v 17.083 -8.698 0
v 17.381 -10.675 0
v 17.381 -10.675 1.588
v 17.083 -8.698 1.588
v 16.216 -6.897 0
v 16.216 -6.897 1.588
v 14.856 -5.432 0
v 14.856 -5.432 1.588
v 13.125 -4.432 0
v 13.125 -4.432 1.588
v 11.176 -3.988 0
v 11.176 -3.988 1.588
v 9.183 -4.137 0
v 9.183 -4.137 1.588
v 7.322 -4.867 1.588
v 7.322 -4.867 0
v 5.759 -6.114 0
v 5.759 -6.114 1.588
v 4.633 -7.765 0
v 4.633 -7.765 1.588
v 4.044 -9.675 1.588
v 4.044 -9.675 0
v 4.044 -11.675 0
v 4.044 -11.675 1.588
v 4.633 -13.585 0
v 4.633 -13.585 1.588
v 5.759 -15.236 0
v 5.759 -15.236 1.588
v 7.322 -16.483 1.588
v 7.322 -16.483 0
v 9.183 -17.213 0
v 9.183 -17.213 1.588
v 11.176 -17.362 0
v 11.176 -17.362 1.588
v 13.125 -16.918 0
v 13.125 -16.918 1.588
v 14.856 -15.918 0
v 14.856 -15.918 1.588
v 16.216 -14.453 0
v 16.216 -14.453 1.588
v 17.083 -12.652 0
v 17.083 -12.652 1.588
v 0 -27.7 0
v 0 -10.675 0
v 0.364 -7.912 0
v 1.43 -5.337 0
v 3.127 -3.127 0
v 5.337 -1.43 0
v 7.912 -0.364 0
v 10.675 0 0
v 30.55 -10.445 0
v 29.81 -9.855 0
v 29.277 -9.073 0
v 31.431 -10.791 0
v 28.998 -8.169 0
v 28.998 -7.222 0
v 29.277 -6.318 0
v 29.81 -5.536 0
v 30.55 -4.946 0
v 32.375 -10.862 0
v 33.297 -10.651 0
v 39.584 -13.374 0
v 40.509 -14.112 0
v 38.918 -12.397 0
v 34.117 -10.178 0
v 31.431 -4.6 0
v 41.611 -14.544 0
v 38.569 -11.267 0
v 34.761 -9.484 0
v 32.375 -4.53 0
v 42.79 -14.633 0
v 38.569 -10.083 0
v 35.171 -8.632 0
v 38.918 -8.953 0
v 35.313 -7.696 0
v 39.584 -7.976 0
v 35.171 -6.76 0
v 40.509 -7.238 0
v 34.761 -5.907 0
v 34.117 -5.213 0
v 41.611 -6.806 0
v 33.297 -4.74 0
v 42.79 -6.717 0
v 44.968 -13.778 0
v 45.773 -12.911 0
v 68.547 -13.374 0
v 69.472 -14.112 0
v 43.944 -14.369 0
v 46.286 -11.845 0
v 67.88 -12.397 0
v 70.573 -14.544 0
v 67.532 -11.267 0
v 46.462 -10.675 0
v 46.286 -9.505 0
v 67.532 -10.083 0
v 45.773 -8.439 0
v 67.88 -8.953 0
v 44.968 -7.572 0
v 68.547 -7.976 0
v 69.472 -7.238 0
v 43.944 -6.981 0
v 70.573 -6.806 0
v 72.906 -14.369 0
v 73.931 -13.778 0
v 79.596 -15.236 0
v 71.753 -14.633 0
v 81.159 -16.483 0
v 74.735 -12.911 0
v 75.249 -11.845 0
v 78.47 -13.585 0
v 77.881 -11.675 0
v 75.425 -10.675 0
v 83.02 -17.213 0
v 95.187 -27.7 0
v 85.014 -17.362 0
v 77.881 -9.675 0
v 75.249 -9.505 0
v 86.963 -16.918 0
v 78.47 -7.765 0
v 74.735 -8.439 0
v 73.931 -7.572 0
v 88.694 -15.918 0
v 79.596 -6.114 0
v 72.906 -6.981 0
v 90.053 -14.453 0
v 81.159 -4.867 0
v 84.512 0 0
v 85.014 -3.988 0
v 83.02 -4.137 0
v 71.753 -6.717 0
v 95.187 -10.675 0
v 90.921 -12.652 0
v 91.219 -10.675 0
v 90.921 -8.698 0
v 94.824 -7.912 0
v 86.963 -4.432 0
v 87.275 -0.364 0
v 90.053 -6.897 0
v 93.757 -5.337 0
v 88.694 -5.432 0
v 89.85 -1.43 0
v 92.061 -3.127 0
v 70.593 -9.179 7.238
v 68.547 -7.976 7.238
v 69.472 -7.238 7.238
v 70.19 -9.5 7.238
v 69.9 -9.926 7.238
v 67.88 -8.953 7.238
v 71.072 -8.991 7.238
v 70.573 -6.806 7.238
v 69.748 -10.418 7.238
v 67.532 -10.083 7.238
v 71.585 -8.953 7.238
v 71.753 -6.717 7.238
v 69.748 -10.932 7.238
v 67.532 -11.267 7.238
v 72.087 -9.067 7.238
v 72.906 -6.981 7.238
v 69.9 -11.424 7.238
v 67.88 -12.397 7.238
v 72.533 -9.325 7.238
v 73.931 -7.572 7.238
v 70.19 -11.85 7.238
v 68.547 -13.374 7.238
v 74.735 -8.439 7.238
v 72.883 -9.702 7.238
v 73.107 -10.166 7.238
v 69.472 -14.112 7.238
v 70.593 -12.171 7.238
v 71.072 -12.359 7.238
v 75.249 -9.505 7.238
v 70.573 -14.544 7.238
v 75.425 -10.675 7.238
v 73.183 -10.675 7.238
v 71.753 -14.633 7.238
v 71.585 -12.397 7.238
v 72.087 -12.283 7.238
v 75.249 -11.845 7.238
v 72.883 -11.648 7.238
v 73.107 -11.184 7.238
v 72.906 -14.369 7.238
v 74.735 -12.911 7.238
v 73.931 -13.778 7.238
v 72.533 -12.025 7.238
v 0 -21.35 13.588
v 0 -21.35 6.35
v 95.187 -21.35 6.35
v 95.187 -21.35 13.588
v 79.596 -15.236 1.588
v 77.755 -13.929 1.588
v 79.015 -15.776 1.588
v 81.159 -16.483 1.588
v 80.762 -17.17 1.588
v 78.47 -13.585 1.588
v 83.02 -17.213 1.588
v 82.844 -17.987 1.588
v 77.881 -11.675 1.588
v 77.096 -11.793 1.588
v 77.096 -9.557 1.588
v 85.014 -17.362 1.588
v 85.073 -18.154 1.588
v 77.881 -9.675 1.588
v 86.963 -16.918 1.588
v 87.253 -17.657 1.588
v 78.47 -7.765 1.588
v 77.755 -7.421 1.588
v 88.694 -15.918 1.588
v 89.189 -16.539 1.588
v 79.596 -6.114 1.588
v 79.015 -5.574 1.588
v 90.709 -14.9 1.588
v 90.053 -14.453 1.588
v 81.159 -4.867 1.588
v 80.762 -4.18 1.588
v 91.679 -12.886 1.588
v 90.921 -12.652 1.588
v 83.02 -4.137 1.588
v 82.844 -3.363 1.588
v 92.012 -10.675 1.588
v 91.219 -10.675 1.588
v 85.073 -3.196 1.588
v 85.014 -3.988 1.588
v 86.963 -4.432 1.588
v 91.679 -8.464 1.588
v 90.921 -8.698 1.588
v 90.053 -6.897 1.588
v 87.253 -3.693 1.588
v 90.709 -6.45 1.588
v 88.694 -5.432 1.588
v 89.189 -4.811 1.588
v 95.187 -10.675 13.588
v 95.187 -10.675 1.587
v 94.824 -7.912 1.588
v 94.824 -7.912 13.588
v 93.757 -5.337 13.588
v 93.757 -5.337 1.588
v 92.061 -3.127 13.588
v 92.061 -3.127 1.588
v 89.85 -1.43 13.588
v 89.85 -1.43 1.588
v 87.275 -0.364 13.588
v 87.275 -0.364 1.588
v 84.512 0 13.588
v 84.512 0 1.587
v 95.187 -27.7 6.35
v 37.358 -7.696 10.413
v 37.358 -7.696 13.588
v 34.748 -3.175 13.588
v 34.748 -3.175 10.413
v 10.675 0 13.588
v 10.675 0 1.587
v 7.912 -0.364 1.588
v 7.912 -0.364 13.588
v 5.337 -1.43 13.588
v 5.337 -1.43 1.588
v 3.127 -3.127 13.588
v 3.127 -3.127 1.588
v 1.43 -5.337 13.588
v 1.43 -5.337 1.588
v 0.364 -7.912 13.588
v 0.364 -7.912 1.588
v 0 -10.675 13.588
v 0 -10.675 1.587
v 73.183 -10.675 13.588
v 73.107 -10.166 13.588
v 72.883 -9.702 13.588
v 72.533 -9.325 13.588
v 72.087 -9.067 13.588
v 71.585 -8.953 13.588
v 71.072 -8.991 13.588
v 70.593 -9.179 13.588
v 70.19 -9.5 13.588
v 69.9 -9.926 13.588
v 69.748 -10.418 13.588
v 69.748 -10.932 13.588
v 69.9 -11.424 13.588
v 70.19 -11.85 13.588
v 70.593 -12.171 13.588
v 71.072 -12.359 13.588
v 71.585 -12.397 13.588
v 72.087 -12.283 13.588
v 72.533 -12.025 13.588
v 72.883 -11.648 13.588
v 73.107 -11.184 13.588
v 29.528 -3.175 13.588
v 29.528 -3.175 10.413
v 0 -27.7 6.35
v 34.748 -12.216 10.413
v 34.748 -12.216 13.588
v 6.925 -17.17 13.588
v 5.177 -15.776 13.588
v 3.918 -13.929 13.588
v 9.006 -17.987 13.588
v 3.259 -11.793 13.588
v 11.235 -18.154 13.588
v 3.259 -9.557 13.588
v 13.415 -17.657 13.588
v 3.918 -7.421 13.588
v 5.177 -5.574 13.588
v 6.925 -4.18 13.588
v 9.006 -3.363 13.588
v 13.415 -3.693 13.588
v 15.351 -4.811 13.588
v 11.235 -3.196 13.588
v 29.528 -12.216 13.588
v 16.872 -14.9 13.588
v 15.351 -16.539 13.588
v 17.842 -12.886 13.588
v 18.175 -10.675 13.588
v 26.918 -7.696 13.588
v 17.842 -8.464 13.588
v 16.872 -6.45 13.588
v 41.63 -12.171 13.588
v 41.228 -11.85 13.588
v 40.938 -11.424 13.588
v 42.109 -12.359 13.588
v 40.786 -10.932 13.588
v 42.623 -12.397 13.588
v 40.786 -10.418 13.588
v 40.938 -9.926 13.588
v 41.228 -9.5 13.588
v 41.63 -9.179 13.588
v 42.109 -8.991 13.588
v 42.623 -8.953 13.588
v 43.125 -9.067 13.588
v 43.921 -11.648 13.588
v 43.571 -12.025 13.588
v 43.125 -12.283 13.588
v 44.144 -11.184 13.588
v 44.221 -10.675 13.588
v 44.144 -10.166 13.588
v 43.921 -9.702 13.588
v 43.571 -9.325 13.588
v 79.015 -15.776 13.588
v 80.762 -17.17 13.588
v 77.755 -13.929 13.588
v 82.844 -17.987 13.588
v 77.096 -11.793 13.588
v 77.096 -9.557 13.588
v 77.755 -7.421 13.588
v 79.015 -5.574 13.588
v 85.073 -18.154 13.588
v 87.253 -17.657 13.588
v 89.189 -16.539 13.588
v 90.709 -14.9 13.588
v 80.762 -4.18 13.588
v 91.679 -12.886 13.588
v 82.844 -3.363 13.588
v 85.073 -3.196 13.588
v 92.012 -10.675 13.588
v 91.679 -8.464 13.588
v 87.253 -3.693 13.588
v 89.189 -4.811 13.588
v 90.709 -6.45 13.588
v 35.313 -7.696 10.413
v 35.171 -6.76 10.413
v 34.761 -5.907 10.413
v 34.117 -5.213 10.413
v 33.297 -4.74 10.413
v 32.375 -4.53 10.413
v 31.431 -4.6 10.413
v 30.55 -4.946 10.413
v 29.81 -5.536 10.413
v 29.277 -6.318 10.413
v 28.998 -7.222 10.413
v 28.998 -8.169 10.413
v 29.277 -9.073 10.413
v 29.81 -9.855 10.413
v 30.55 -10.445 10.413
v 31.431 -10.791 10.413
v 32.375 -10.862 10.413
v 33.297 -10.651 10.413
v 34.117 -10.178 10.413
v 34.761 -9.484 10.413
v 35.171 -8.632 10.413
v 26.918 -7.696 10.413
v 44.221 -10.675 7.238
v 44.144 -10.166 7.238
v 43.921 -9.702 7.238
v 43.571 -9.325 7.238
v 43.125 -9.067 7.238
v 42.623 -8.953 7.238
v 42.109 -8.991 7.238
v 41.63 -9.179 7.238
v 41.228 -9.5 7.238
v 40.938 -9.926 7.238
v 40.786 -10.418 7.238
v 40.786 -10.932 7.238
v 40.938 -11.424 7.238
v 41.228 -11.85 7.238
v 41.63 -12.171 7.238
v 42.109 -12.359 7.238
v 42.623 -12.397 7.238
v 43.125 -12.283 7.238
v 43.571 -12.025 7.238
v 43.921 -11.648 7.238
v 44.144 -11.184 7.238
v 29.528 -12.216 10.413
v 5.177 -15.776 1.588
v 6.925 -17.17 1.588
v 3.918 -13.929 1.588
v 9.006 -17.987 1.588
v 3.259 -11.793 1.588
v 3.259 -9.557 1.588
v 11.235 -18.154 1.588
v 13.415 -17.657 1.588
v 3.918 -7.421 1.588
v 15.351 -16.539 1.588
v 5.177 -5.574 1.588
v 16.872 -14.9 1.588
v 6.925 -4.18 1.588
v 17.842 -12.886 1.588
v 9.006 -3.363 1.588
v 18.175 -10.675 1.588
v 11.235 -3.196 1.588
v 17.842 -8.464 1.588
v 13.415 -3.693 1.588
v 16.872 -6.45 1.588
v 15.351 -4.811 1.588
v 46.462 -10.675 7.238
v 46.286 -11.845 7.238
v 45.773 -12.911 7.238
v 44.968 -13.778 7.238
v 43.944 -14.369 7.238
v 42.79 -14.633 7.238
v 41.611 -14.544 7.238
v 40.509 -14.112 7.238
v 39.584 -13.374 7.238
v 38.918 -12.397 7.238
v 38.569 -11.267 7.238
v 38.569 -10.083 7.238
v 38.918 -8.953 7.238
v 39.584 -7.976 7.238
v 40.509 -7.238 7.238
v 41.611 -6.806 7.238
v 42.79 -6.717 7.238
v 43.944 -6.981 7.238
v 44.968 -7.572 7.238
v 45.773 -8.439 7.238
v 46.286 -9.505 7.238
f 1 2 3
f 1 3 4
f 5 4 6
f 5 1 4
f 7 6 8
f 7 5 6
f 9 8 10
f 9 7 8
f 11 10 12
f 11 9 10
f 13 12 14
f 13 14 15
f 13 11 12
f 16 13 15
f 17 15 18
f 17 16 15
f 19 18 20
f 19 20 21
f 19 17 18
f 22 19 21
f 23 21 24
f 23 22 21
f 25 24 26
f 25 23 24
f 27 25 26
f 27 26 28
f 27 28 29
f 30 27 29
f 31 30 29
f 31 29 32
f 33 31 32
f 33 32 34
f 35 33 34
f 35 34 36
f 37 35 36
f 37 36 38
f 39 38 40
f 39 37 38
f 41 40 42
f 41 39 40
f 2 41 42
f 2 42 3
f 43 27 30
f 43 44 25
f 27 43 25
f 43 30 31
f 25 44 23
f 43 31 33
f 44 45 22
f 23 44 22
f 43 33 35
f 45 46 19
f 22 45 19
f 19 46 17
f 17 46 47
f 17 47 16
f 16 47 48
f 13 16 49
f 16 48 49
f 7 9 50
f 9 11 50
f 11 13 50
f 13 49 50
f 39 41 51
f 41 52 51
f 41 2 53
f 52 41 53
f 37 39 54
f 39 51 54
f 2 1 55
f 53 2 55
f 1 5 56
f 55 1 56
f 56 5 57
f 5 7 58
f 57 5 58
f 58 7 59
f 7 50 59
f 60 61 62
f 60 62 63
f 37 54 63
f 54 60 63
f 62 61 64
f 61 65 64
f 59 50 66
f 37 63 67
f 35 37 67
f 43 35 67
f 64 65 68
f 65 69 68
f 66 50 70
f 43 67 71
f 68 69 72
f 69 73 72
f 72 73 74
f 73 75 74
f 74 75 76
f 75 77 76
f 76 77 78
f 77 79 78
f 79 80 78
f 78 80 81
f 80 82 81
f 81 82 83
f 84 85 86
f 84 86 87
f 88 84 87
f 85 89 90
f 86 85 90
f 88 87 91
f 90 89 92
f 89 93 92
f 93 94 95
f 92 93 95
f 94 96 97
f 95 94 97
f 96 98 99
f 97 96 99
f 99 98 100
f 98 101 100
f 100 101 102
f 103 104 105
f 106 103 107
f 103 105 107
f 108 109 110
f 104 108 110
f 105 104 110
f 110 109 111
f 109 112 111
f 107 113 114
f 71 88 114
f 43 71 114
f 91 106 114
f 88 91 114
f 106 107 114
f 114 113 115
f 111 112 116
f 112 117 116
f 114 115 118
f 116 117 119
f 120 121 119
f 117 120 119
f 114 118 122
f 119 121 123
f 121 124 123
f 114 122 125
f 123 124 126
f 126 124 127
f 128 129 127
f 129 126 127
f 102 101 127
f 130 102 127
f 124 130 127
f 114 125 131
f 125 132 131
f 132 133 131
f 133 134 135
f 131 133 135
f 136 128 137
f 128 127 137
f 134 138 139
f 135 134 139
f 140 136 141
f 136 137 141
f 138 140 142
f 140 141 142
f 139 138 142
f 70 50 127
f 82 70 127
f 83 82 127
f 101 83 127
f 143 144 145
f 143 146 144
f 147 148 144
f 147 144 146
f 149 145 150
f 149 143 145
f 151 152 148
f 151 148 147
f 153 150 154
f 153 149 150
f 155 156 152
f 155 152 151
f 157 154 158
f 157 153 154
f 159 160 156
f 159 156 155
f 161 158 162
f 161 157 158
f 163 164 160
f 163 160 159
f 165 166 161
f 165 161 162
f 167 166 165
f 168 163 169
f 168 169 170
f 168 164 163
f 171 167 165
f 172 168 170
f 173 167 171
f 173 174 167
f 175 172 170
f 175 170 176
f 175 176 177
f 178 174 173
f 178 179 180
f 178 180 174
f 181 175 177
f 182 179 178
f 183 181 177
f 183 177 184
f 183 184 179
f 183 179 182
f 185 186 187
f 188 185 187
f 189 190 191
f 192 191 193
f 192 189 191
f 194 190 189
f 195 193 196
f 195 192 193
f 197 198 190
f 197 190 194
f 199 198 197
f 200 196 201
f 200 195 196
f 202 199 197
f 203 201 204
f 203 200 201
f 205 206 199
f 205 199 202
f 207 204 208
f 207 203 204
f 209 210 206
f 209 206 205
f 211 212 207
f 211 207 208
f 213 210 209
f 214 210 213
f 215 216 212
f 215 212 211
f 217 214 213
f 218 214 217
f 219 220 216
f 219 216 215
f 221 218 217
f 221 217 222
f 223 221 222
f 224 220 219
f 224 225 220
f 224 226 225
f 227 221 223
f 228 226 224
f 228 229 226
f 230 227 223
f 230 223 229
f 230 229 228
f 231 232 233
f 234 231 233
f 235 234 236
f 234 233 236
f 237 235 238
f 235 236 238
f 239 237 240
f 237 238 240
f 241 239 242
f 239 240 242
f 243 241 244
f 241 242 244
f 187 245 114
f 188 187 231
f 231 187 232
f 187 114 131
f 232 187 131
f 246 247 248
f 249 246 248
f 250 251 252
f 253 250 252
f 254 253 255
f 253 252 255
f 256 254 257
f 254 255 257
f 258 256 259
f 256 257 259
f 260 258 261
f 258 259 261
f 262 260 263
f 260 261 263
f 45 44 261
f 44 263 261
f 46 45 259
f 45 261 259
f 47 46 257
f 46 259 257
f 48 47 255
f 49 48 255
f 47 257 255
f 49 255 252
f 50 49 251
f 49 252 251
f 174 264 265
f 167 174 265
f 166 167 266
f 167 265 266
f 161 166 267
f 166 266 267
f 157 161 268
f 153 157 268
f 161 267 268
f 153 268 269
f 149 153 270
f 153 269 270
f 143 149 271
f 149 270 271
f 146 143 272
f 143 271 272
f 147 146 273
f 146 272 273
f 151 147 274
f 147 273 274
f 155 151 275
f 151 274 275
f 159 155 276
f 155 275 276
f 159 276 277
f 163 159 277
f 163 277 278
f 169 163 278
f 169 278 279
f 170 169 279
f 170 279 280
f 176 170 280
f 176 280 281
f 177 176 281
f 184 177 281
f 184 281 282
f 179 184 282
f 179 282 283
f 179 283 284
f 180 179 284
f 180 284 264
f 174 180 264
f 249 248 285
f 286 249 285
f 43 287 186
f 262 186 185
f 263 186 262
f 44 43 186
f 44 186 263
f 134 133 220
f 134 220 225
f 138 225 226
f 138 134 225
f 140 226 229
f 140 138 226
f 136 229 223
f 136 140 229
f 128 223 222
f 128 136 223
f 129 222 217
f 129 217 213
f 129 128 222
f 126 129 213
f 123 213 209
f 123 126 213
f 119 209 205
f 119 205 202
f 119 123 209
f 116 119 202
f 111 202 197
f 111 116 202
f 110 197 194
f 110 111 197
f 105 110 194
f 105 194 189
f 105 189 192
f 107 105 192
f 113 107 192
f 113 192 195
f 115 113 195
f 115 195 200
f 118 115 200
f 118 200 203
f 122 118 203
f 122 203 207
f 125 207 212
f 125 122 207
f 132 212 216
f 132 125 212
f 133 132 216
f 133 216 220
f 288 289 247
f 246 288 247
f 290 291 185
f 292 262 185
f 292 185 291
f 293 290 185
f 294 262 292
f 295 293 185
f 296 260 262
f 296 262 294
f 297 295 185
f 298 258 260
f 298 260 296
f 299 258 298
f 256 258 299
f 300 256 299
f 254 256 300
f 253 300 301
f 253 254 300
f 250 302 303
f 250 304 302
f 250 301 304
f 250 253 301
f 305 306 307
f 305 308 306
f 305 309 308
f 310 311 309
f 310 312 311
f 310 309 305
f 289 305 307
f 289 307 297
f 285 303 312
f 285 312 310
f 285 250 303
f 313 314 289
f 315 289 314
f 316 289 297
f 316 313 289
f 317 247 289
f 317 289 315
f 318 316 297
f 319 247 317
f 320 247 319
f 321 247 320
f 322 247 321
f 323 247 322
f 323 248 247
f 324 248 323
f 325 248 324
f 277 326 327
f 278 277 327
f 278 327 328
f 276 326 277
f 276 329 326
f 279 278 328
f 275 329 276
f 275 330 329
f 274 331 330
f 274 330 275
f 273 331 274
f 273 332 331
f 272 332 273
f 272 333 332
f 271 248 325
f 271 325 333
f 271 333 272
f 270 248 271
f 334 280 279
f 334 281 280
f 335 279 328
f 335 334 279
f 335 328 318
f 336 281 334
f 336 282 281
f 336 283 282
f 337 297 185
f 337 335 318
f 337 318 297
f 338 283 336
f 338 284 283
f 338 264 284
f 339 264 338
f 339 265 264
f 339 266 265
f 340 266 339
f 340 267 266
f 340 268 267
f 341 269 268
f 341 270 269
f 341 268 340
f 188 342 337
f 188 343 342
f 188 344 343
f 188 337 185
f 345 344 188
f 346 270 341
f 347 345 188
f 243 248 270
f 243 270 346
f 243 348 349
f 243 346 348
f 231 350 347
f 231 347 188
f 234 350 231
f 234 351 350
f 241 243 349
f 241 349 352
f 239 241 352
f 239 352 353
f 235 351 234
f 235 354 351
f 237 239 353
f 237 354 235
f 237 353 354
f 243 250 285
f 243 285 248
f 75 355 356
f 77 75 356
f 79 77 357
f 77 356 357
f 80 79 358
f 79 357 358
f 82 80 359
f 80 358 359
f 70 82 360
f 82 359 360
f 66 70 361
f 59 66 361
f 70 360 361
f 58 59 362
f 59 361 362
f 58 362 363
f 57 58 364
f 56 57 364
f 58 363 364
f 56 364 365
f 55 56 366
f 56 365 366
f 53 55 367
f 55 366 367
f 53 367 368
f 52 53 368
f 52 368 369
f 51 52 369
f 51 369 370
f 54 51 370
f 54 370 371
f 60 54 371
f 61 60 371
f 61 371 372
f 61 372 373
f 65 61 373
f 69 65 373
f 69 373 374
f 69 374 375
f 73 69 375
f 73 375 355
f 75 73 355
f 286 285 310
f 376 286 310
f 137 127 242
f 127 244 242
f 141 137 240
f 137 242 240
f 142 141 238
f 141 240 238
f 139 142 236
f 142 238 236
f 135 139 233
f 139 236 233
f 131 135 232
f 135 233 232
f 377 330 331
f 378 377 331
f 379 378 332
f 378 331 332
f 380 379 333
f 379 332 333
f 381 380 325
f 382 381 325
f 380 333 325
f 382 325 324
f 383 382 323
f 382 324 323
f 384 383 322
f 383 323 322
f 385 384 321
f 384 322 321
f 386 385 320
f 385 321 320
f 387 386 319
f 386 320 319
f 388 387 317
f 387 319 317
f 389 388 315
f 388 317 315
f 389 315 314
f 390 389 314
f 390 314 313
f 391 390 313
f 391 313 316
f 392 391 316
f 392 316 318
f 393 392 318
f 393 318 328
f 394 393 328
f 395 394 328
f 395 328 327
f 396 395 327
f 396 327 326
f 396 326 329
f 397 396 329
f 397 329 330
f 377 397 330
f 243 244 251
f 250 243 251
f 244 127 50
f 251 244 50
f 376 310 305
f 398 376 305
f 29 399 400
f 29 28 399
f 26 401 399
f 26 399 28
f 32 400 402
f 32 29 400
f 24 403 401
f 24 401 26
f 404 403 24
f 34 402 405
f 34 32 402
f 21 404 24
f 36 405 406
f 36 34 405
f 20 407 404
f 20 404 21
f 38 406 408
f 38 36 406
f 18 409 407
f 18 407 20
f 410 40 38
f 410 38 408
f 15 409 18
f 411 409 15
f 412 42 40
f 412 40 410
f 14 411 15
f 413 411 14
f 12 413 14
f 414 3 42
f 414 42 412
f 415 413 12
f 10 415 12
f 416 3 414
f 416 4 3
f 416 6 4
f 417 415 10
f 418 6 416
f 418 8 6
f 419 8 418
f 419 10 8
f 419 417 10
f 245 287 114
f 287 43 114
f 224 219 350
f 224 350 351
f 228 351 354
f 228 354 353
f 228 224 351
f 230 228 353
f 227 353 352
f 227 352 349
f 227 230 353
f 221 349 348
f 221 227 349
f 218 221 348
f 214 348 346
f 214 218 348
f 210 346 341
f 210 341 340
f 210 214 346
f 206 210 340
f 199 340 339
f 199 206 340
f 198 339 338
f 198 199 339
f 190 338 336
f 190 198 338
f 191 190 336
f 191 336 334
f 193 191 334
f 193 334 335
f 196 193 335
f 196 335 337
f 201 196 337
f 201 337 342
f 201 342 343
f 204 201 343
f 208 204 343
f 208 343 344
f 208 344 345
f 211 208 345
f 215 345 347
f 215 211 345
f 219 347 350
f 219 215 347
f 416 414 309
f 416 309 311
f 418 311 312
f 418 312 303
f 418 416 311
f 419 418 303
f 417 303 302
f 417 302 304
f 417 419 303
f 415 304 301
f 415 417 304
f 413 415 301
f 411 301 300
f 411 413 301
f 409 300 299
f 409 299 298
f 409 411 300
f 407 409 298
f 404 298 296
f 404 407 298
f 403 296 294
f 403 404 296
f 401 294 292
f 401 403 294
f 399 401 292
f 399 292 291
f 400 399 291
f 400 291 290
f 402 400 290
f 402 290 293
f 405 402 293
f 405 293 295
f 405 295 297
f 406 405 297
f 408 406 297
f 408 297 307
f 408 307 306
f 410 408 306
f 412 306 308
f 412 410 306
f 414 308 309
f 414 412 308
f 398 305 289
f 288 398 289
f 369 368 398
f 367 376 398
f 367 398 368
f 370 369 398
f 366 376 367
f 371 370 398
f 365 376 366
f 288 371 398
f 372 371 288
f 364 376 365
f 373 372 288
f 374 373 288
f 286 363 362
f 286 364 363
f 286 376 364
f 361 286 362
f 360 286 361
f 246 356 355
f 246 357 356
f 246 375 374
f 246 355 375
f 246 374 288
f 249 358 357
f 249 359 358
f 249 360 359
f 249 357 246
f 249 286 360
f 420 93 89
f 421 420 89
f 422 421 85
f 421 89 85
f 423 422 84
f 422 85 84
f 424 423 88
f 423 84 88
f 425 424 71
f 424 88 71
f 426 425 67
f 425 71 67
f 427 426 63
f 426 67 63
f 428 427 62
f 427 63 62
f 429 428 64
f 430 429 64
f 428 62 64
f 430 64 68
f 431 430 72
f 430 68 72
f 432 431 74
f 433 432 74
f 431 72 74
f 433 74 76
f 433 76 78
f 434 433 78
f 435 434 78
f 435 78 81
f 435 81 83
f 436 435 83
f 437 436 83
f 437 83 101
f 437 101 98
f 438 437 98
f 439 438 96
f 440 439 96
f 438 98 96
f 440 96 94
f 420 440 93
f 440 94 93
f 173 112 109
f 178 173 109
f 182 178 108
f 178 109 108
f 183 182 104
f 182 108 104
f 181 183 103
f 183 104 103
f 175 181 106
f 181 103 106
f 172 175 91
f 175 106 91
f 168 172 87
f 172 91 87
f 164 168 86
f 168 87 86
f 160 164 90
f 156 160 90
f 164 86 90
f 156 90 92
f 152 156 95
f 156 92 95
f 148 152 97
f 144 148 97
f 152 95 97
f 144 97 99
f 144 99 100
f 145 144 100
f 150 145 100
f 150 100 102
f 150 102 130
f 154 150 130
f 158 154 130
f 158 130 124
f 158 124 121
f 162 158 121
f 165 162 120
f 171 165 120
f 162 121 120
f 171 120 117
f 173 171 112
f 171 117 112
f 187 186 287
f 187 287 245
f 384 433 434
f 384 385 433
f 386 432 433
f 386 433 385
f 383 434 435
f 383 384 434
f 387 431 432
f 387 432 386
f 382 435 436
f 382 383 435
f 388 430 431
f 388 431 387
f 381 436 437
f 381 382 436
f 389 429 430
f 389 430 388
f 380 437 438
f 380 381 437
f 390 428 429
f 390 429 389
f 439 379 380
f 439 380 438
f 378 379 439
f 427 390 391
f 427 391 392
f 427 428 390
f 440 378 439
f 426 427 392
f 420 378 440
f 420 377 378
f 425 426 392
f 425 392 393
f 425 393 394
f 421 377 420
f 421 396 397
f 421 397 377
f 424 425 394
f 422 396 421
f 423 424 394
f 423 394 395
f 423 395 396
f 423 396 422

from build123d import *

# Parameters (mm, degrees)
F0_W      = 95.1874652
F0_H      = 27.6999954
F0_R      = 6.7062477
F1_DEPTH  = 1.5875
F2_R      = 10.6749977
F3_R      = 7.5
F4_DEPTH  = 12
F5_DEPTH  = 4.7625
F6_R      = 1.7272
F6_R_2    = 3.175
F7_DEPTH  = 13.5875
F8_R      = 3.96875
F9_DEPTH  = 7.2375014
F11_DEPTH = 3.175


with BuildPart() as f1:
    # F0 (on Top) → F1 (new body)
    with BuildSketch(Plane.XY):
        with Locations((47.5937326, -13.8499977)):
            Rectangle(F0_W, F0_H)
        with Locations((10.6749977, -10.6749977)):
            Circle(F0_R, mode=Mode.SUBTRACT)
        with Locations((84.5124675, -10.6749977)):
            Circle(F0_R, mode=Mode.SUBTRACT)
    extrude(amount=F1_DEPTH)

    # F2
    f2_edges = [f1.edges().sort_by_distance(p)[0] for p in [
        (0, 0, 0.79375),
        (95.187465, 0, 0.79375),
    ]]
    fillet(f2_edges, radius=F2_R)

    # F3 (on face) → F4 (join)
    with BuildSketch(Plane.XY.offset(1.5875)):
        with BuildLine():
            Line((0, -10.6749977), (0, -21.3499954))
            Line((0, -21.3499954), (95.1874652, -21.3499954))
            Line((95.1874652, -21.3499954), (95.1874652, -10.6749977))
            ThreePointArc((95.1874652, -10.6749977), (92.0608307628, -3.1266344372), (84.5124675, 0))
            Line((84.5124675, 0), (10.6749977, 0))
            ThreePointArc((10.6749977, 0), (3.1266344372, -3.1266344372), (0, -10.6749977))
        make_face()
        with Locations((10.6749977, -10.6749977)):
            Circle(F3_R, mode=Mode.SUBTRACT)
        with Locations((84.5124675, -10.6749977)):
            Circle(F3_R, mode=Mode.SUBTRACT)
    extrude(amount=F4_DEPTH)

    # F5 (add): a face of the model
    f5_faces = [f1.faces().sort_by_distance(p)[0] for p in [
        (47.5937326, -24.5249954, 1.5875),
    ]]
    extrude(f5_faces, amount=F5_DEPTH)

    # F6 (on face) → F7 (cut, through all)
    with BuildSketch(Plane.XY.offset(13.5875)):
        with Locations((42.4937295646, -10.6749977)):
            Circle(F6_R)
        with Locations((71.4562175, -10.6749977)):
            Circle(F6_R)
        with Locations((32.1375151, -7.6956539)):
            Circle(F6_R_2)
    extrude(amount=-F7_DEPTH, mode=Mode.SUBTRACT)

    # F8 (on face) → F9 (cut)
    with BuildSketch(Plane(origin=(0, 0, 0), x_dir=(1, 0, 0), z_dir=(0, 0, -1))):
        with Locations((71.4562175, 10.6749977)):
            Circle(F8_R)
        with Locations((42.4937295646, 10.6749977)):
            Circle(F8_R)
    extrude(amount=-F9_DEPTH, mode=Mode.SUBTRACT)

    # F10 (on face) → F11 (cut)
    with BuildSketch(Plane.XY.offset(13.5875)):
        Polygon((34.7475158461, -3.175), (29.5275143539, -3.175), (26.9175136078, -7.6956539), (29.5275143539, -12.2163078), (34.7475158461, -12.2163078), (37.3575165922, -7.6956539), align=None)
    extrude(amount=-F11_DEPTH, mode=Mode.SUBTRACT)


solid = f1.part
